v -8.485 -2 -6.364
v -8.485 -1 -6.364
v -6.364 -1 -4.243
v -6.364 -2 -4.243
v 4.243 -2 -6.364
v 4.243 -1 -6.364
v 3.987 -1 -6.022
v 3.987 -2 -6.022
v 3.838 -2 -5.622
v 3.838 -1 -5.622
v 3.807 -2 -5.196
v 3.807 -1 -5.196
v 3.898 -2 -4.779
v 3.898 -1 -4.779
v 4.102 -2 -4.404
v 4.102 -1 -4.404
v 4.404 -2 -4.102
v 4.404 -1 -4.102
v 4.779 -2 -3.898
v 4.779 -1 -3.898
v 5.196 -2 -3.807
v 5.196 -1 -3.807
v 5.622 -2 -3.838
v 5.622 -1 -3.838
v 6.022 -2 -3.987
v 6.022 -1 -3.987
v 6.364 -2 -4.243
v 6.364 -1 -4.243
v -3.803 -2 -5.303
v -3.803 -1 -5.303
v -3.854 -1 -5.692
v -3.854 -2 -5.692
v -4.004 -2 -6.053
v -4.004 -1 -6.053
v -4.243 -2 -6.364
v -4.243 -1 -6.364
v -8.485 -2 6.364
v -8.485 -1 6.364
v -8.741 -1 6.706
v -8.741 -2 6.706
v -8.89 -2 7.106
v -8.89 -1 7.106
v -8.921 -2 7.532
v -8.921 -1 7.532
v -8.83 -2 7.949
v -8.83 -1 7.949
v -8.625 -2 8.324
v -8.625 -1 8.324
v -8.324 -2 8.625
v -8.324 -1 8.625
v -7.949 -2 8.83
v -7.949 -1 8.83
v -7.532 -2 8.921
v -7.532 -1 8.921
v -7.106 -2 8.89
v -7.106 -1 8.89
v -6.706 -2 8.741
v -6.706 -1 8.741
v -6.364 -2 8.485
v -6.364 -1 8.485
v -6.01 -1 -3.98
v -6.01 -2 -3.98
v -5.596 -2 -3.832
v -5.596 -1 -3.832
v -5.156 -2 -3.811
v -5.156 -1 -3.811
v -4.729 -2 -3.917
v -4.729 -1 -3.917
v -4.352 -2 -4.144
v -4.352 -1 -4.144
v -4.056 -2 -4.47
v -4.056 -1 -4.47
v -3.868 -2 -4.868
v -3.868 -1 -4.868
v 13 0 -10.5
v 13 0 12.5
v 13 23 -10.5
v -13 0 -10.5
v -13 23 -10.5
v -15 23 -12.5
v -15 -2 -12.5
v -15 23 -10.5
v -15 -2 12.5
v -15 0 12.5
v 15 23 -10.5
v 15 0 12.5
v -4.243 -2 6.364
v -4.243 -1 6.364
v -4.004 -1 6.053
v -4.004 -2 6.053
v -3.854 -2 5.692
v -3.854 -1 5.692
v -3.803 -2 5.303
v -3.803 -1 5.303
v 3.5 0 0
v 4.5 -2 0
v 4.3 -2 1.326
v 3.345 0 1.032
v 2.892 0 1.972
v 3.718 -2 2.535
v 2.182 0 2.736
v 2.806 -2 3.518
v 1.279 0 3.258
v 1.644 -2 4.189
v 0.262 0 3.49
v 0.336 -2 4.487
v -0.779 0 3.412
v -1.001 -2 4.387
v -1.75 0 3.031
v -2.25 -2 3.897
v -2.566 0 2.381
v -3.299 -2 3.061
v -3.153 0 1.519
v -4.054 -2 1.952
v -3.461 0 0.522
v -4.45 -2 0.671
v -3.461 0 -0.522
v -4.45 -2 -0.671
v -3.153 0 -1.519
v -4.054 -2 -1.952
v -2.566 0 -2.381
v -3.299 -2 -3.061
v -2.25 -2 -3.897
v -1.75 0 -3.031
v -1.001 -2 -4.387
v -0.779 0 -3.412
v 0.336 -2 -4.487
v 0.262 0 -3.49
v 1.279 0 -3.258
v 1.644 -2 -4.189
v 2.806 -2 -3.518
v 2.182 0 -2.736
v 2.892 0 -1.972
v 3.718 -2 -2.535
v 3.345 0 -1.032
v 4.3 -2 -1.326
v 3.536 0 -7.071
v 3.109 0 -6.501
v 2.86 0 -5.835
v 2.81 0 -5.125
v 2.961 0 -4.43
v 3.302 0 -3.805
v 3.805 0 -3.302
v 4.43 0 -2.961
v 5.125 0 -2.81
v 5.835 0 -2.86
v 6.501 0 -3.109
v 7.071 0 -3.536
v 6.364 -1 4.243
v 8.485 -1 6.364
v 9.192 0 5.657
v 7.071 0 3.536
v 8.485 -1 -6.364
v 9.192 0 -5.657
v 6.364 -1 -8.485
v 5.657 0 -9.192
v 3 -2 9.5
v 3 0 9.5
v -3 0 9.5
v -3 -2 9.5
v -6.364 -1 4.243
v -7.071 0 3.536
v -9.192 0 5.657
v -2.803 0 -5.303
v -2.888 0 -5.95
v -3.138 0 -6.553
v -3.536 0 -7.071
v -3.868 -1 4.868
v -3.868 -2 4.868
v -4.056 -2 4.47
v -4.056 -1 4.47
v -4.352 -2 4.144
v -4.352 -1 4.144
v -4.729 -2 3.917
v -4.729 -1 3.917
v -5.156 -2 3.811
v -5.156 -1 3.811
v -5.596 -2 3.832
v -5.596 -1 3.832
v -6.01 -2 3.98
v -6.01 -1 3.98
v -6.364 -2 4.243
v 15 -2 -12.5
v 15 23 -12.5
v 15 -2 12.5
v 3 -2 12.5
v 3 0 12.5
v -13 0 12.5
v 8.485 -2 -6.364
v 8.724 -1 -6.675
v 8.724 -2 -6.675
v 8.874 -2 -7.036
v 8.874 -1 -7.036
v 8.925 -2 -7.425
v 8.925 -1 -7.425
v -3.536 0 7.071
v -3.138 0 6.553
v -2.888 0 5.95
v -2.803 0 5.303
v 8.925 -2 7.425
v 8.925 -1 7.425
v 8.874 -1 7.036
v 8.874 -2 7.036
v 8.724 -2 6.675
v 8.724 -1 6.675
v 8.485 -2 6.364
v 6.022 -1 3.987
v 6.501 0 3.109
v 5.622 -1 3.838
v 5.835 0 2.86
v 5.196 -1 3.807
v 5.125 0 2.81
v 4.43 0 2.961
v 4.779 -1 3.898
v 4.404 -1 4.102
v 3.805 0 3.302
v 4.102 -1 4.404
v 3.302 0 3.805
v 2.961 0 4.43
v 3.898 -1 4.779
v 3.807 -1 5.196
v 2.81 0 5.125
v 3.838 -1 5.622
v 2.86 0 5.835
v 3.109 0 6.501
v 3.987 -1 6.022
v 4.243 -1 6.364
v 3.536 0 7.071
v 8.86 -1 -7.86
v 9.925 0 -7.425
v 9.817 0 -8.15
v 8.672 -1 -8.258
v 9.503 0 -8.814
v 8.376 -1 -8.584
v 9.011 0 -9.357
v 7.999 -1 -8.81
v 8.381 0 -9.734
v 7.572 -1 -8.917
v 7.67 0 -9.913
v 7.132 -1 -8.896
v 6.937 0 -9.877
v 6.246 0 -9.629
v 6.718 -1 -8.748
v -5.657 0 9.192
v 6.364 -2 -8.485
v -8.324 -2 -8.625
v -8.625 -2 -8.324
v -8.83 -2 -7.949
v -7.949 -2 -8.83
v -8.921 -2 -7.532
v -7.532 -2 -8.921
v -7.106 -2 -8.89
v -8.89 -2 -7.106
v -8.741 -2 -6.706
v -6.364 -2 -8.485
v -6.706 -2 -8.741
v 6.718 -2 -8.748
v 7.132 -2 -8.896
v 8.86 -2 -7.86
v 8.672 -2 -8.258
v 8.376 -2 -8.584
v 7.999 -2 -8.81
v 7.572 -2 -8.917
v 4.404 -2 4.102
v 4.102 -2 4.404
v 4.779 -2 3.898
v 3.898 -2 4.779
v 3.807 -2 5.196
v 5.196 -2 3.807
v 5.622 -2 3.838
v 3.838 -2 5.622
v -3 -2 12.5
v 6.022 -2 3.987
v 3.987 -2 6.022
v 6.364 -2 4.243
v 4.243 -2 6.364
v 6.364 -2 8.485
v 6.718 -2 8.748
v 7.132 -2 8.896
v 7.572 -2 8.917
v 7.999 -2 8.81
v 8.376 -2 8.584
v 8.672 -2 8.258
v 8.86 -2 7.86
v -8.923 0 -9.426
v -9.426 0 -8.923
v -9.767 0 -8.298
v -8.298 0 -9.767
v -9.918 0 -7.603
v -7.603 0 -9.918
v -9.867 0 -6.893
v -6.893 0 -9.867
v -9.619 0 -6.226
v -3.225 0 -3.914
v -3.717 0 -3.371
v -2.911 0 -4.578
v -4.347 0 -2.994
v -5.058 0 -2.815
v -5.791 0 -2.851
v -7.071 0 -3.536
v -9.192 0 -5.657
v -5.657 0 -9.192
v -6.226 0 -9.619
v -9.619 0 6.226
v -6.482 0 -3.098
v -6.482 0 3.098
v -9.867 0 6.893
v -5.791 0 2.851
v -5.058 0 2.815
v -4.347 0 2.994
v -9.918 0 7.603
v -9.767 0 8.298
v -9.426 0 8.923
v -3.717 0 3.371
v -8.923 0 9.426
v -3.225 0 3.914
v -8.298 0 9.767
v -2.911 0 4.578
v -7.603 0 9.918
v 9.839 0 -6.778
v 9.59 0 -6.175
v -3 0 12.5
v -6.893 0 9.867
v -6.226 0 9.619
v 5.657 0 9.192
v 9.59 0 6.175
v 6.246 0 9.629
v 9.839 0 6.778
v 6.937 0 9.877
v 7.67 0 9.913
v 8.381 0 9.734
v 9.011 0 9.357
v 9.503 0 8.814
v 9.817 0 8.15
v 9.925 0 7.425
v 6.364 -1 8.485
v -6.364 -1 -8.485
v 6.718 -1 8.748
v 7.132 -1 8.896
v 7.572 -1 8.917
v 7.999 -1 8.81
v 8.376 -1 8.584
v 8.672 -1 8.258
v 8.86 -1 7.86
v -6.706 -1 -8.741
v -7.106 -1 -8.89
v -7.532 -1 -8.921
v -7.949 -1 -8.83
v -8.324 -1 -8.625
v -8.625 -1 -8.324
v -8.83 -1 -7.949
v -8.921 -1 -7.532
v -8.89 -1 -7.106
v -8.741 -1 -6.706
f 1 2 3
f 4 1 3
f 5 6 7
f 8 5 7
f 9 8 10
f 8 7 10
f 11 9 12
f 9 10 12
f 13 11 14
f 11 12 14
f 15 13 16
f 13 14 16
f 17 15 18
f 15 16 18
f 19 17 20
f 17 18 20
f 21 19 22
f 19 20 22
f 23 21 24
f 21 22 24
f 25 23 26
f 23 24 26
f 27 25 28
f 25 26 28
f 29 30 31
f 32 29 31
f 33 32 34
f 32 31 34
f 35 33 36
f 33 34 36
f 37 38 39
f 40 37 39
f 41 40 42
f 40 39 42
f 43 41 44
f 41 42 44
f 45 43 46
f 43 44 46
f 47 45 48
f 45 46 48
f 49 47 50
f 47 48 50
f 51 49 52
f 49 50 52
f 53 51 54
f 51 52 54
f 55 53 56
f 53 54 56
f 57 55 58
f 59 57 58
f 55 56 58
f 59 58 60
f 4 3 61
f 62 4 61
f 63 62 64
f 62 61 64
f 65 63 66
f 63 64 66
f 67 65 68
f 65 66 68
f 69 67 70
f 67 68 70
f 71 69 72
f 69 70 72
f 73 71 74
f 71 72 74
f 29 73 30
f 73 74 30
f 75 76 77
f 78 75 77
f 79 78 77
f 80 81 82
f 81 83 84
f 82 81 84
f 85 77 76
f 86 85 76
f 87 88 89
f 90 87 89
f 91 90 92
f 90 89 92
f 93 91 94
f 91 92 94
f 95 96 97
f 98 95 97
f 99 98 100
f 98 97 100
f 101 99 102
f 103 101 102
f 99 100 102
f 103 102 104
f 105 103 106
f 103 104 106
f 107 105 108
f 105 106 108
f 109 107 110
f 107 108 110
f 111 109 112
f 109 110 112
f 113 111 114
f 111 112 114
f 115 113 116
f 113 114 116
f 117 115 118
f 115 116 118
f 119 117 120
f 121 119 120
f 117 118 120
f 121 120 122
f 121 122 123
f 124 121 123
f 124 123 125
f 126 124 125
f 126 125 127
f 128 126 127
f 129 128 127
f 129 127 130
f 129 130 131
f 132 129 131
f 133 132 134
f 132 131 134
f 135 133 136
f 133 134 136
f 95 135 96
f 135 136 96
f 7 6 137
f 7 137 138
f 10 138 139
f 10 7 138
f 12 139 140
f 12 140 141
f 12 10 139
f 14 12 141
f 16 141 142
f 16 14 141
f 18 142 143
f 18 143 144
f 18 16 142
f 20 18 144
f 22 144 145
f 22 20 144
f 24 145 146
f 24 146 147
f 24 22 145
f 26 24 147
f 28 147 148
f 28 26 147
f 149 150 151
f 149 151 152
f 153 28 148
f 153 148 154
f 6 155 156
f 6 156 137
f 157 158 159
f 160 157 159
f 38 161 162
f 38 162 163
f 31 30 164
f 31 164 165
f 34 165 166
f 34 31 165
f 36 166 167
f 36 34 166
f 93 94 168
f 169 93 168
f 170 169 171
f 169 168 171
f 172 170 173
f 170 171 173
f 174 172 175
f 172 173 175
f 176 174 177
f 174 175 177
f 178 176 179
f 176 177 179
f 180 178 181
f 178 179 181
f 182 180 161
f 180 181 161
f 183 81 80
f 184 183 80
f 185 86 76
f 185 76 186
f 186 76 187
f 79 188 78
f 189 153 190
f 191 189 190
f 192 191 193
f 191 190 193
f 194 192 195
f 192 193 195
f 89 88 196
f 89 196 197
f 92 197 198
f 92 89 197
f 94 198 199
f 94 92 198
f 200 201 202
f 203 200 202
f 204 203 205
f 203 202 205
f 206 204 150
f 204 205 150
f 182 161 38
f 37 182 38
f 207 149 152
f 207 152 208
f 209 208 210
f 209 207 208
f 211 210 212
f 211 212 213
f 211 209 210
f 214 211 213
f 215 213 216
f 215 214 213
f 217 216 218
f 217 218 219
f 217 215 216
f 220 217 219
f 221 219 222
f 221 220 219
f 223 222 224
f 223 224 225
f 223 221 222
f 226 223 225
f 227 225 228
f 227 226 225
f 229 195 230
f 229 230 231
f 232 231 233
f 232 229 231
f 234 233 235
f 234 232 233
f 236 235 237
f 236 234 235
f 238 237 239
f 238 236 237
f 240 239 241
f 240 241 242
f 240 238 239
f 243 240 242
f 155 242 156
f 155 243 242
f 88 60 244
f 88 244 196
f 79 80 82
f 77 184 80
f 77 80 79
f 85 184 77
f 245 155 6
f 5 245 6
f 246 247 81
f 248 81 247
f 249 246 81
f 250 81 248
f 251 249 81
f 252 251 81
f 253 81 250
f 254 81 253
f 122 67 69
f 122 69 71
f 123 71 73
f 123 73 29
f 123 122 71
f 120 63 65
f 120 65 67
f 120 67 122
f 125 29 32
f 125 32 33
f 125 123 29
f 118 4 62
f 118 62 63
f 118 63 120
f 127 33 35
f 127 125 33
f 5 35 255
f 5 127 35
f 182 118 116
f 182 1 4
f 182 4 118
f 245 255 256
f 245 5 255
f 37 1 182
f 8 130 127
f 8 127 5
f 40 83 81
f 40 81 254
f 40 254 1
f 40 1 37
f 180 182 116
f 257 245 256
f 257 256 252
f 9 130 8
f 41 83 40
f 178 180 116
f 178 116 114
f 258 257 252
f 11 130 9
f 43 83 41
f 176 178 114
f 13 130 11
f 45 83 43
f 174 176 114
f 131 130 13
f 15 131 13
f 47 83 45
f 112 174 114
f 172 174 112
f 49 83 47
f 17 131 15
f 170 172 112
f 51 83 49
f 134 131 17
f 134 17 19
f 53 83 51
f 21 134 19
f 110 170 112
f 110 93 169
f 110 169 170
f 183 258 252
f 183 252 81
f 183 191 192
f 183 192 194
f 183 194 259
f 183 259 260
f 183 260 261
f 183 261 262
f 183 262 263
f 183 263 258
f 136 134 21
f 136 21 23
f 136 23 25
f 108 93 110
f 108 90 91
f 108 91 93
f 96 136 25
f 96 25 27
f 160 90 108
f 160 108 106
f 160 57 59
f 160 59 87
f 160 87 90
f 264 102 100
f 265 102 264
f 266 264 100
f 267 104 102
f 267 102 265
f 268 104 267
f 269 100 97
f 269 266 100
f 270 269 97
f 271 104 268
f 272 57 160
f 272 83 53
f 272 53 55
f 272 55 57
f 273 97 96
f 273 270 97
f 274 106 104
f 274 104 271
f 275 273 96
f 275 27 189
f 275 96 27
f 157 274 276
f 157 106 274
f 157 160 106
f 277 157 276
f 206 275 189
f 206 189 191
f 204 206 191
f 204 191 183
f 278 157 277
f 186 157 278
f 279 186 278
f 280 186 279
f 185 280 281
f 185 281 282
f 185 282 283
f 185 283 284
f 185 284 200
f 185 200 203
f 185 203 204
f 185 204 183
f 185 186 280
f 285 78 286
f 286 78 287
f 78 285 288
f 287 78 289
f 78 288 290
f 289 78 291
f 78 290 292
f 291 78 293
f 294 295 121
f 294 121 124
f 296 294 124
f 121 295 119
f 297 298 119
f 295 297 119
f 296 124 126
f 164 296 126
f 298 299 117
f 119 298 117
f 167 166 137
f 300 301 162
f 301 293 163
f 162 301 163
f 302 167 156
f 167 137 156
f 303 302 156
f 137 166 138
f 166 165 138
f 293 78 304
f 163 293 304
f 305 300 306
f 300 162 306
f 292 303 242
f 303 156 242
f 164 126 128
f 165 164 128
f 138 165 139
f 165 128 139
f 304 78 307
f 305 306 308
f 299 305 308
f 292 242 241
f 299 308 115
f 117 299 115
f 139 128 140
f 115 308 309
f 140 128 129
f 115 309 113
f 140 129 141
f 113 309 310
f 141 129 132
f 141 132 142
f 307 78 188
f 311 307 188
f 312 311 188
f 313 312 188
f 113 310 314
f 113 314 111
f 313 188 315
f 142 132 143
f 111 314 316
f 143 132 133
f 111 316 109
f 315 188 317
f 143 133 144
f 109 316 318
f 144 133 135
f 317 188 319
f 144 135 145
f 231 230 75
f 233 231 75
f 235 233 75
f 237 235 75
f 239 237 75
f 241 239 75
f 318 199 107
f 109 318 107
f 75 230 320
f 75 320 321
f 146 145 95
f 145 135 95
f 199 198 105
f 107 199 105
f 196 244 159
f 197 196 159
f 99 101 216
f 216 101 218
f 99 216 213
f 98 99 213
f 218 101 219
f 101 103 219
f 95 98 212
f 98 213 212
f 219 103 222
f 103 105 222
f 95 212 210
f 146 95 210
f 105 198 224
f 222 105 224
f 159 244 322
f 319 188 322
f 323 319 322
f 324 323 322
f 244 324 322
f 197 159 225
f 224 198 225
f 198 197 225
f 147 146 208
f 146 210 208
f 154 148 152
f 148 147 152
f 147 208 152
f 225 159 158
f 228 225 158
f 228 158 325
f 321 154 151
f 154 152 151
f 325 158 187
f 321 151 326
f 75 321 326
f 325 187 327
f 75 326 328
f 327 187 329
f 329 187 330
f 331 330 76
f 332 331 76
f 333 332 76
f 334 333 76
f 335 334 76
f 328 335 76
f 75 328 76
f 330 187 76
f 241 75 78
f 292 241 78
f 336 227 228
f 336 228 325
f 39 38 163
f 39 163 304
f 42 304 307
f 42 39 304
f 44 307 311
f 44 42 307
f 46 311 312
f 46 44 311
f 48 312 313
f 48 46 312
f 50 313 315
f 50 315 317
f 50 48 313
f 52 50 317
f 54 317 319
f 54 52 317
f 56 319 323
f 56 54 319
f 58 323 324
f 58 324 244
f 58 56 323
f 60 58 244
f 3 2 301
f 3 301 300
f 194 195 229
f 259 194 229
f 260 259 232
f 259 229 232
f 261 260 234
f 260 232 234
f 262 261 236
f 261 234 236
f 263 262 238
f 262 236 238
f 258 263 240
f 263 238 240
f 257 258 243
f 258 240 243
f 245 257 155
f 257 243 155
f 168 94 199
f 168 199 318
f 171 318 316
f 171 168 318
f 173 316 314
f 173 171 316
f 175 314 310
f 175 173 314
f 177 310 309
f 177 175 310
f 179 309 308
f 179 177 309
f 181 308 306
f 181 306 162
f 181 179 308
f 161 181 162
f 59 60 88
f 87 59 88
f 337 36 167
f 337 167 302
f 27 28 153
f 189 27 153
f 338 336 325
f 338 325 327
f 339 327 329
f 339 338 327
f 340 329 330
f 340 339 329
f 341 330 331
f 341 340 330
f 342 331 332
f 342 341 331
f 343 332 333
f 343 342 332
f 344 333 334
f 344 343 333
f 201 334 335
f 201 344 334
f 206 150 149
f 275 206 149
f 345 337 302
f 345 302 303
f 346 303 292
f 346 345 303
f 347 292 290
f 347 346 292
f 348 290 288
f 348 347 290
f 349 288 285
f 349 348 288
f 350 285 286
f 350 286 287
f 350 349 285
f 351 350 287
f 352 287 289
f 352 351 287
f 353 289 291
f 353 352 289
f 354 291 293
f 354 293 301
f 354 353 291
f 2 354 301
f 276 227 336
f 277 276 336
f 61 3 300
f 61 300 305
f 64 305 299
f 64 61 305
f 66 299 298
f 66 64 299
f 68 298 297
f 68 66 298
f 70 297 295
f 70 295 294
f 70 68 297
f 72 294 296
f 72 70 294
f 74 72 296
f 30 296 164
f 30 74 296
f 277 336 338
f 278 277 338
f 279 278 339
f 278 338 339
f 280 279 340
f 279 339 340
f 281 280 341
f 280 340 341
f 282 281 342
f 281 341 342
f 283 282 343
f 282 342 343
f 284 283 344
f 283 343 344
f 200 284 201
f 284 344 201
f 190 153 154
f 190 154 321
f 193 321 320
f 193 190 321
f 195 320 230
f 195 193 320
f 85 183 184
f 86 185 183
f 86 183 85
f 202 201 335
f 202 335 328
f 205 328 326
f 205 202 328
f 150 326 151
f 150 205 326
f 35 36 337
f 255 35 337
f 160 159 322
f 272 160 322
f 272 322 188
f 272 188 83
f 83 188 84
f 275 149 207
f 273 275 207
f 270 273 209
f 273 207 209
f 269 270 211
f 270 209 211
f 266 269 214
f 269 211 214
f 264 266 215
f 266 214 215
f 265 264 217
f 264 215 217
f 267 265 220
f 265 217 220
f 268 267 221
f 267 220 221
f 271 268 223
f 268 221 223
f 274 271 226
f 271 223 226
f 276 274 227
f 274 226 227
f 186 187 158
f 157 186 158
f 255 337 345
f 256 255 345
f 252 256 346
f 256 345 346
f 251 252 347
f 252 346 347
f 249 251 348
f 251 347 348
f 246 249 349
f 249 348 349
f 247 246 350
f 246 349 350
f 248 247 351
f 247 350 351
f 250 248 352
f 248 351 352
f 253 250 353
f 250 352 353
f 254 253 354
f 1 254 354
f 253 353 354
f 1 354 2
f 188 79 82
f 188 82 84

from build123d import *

# Parameters (mm, degrees)
F0_R     = 3.5
F1_DEPTH = 2
F2_W     = 23
F2_H     = 2
F3_DEPTH = 15
F4_START = 13
F4_DEPTH = 2
F5_START = -13
F5_DEPTH = 2
F6_SIZE  = 1
F7_SIZE2 = 0.99999
F7_SIZE  = 1.99999


# Not quite as in the source:
# - a fillet or chamfer is up to 0.001 mm smaller than in the source, because OpenCascade refuses the exact size


with BuildPart() as f1:
    # F0 (on Front) → F1 (new body)
    with BuildSketch(Plane.XZ):
        Polygon((-3, 12.5), (-15, 12.5), (-15, -12.5), (15, -12.5), (15, 12.5), (3, 12.5), (3, 9.5), (-3, 9.5), align=None)
        with BuildLine():
            ThreePointArc((-6.3639610307, -8.4852813742), (-8.4852813742, -8.4852813742), (-8.4852813742, -6.3639610307))
            Line((-8.4852813742, -6.3639610307), (-6.3639610307, -4.2426406871))
            ThreePointArc((-6.3639610307, -4.2426406871), (-4.7292757104, -3.9174815601), (-3.8033008589, -5.3033008589))
            ThreePointArc((-3.8033008589, -5.3033008589), (-3.9174815601, -5.8773260074), (-4.2426406871, -6.3639610307))
            Line((-4.2426406871, -6.3639610307), (-6.3639610307, -8.4852813742))
        make_face(mode=Mode.SUBTRACT)
        with BuildLine():
            ThreePointArc((8.4852813742, -6.3639610307), (8.8104405012, -6.8505960539), (8.9246212025, -7.4246212025))
            ThreePointArc((8.9246212025, -7.4246212025), (7.998646351, -8.8104405012), (6.3639610307, -8.4852813742))
            Line((6.3639610307, -8.4852813742), (4.2426406871, -6.3639610307))
            ThreePointArc((4.2426406871, -6.3639610307), (4.2426406871, -4.2426406871), (6.3639610307, -4.2426406871))
            Line((6.3639610307, -4.2426406871), (8.4852813742, -6.3639610307))
        make_face(mode=Mode.SUBTRACT)
        with BuildLine():
            ThreePointArc((-8.4852813742, 6.3639610307), (-8.4852813742, 8.4852813742), (-6.3639610307, 8.4852813742))
            Line((-6.3639610307, 8.4852813742), (-4.2426406871, 6.3639610307))
            ThreePointArc((-4.2426406871, 6.3639610307), (-3.9174815601, 5.8773260074), (-3.8033008589, 5.3033008589))
            ThreePointArc((-3.8033008589, 5.3033008589), (-4.7292757104, 3.9174815601), (-6.3639610307, 4.2426406871))
            Line((-6.3639610307, 4.2426406871), (-8.4852813742, 6.3639610307))
        make_face(mode=Mode.SUBTRACT)
        Circle(F0_R, mode=Mode.SUBTRACT)
        with BuildLine():
            ThreePointArc((6.3639610307, 8.4852813742), (7.998646351, 8.8104405012), (8.9246212025, 7.4246212025))
            ThreePointArc((8.9246212025, 7.4246212025), (8.8104405012, 6.8505960539), (8.4852813742, 6.3639610307))
            Line((8.4852813742, 6.3639610307), (6.3639610307, 4.2426406871))
            ThreePointArc((6.3639610307, 4.2426406871), (4.2426406871, 4.2426406871), (4.2426406871, 6.3639610307))
            Line((4.2426406871, 6.3639610307), (6.3639610307, 8.4852813742))
        make_face(mode=Mode.SUBTRACT)
    extrude(amount=F1_DEPTH)

    # F2 (on Right) → F3 (join, symmetric)
    with BuildSketch(Plane.YZ):
        with Locations((11.5, -11.5)):
            Rectangle(F2_W, F2_H)
    extrude(amount=F3_DEPTH, both=True)

    # F2 (on Right) → F4 (join)
    with BuildSketch(Plane.YZ.offset(F4_START)):
        Polygon((0, 12.5), (0, -10.5), (23, -10.5), align=None)
    extrude(amount=F4_DEPTH)

    # F2 (on Right) → F5 (join)
    with BuildSketch(Plane.YZ.offset(F5_START)):
        Polygon((0, 12.5), (0, -10.5), (23, -10.5), align=None)
    extrude(amount=-F5_DEPTH)

    # F6
    f6_edges = [f1.edges().sort_by_distance(p)[0] for p in [
        (5.303301, 0, 7.424621),
        (-5.303301, 0, 7.424621),
        (-7.424621, 0, -5.303301),
        (7.424621, 0, -5.303301),
    ]]
    chamfer(f6_edges, length=F6_SIZE)

    # F7 (size 2 and 1 in the source; OpenCascade refuses exactly that, so slightly less here)
    f7_edges = [f1.edges().sort_by_distance(p)[0] for p in [
        (-3.5, -2, 0),
    ]]
    f7_side = f1.faces().sort_by_distance((-3.5, -1, 0))[0]
    chamfer(f7_edges, length=F7_SIZE, length2=F7_SIZE2, reference=f7_side)


solid = f1.part
